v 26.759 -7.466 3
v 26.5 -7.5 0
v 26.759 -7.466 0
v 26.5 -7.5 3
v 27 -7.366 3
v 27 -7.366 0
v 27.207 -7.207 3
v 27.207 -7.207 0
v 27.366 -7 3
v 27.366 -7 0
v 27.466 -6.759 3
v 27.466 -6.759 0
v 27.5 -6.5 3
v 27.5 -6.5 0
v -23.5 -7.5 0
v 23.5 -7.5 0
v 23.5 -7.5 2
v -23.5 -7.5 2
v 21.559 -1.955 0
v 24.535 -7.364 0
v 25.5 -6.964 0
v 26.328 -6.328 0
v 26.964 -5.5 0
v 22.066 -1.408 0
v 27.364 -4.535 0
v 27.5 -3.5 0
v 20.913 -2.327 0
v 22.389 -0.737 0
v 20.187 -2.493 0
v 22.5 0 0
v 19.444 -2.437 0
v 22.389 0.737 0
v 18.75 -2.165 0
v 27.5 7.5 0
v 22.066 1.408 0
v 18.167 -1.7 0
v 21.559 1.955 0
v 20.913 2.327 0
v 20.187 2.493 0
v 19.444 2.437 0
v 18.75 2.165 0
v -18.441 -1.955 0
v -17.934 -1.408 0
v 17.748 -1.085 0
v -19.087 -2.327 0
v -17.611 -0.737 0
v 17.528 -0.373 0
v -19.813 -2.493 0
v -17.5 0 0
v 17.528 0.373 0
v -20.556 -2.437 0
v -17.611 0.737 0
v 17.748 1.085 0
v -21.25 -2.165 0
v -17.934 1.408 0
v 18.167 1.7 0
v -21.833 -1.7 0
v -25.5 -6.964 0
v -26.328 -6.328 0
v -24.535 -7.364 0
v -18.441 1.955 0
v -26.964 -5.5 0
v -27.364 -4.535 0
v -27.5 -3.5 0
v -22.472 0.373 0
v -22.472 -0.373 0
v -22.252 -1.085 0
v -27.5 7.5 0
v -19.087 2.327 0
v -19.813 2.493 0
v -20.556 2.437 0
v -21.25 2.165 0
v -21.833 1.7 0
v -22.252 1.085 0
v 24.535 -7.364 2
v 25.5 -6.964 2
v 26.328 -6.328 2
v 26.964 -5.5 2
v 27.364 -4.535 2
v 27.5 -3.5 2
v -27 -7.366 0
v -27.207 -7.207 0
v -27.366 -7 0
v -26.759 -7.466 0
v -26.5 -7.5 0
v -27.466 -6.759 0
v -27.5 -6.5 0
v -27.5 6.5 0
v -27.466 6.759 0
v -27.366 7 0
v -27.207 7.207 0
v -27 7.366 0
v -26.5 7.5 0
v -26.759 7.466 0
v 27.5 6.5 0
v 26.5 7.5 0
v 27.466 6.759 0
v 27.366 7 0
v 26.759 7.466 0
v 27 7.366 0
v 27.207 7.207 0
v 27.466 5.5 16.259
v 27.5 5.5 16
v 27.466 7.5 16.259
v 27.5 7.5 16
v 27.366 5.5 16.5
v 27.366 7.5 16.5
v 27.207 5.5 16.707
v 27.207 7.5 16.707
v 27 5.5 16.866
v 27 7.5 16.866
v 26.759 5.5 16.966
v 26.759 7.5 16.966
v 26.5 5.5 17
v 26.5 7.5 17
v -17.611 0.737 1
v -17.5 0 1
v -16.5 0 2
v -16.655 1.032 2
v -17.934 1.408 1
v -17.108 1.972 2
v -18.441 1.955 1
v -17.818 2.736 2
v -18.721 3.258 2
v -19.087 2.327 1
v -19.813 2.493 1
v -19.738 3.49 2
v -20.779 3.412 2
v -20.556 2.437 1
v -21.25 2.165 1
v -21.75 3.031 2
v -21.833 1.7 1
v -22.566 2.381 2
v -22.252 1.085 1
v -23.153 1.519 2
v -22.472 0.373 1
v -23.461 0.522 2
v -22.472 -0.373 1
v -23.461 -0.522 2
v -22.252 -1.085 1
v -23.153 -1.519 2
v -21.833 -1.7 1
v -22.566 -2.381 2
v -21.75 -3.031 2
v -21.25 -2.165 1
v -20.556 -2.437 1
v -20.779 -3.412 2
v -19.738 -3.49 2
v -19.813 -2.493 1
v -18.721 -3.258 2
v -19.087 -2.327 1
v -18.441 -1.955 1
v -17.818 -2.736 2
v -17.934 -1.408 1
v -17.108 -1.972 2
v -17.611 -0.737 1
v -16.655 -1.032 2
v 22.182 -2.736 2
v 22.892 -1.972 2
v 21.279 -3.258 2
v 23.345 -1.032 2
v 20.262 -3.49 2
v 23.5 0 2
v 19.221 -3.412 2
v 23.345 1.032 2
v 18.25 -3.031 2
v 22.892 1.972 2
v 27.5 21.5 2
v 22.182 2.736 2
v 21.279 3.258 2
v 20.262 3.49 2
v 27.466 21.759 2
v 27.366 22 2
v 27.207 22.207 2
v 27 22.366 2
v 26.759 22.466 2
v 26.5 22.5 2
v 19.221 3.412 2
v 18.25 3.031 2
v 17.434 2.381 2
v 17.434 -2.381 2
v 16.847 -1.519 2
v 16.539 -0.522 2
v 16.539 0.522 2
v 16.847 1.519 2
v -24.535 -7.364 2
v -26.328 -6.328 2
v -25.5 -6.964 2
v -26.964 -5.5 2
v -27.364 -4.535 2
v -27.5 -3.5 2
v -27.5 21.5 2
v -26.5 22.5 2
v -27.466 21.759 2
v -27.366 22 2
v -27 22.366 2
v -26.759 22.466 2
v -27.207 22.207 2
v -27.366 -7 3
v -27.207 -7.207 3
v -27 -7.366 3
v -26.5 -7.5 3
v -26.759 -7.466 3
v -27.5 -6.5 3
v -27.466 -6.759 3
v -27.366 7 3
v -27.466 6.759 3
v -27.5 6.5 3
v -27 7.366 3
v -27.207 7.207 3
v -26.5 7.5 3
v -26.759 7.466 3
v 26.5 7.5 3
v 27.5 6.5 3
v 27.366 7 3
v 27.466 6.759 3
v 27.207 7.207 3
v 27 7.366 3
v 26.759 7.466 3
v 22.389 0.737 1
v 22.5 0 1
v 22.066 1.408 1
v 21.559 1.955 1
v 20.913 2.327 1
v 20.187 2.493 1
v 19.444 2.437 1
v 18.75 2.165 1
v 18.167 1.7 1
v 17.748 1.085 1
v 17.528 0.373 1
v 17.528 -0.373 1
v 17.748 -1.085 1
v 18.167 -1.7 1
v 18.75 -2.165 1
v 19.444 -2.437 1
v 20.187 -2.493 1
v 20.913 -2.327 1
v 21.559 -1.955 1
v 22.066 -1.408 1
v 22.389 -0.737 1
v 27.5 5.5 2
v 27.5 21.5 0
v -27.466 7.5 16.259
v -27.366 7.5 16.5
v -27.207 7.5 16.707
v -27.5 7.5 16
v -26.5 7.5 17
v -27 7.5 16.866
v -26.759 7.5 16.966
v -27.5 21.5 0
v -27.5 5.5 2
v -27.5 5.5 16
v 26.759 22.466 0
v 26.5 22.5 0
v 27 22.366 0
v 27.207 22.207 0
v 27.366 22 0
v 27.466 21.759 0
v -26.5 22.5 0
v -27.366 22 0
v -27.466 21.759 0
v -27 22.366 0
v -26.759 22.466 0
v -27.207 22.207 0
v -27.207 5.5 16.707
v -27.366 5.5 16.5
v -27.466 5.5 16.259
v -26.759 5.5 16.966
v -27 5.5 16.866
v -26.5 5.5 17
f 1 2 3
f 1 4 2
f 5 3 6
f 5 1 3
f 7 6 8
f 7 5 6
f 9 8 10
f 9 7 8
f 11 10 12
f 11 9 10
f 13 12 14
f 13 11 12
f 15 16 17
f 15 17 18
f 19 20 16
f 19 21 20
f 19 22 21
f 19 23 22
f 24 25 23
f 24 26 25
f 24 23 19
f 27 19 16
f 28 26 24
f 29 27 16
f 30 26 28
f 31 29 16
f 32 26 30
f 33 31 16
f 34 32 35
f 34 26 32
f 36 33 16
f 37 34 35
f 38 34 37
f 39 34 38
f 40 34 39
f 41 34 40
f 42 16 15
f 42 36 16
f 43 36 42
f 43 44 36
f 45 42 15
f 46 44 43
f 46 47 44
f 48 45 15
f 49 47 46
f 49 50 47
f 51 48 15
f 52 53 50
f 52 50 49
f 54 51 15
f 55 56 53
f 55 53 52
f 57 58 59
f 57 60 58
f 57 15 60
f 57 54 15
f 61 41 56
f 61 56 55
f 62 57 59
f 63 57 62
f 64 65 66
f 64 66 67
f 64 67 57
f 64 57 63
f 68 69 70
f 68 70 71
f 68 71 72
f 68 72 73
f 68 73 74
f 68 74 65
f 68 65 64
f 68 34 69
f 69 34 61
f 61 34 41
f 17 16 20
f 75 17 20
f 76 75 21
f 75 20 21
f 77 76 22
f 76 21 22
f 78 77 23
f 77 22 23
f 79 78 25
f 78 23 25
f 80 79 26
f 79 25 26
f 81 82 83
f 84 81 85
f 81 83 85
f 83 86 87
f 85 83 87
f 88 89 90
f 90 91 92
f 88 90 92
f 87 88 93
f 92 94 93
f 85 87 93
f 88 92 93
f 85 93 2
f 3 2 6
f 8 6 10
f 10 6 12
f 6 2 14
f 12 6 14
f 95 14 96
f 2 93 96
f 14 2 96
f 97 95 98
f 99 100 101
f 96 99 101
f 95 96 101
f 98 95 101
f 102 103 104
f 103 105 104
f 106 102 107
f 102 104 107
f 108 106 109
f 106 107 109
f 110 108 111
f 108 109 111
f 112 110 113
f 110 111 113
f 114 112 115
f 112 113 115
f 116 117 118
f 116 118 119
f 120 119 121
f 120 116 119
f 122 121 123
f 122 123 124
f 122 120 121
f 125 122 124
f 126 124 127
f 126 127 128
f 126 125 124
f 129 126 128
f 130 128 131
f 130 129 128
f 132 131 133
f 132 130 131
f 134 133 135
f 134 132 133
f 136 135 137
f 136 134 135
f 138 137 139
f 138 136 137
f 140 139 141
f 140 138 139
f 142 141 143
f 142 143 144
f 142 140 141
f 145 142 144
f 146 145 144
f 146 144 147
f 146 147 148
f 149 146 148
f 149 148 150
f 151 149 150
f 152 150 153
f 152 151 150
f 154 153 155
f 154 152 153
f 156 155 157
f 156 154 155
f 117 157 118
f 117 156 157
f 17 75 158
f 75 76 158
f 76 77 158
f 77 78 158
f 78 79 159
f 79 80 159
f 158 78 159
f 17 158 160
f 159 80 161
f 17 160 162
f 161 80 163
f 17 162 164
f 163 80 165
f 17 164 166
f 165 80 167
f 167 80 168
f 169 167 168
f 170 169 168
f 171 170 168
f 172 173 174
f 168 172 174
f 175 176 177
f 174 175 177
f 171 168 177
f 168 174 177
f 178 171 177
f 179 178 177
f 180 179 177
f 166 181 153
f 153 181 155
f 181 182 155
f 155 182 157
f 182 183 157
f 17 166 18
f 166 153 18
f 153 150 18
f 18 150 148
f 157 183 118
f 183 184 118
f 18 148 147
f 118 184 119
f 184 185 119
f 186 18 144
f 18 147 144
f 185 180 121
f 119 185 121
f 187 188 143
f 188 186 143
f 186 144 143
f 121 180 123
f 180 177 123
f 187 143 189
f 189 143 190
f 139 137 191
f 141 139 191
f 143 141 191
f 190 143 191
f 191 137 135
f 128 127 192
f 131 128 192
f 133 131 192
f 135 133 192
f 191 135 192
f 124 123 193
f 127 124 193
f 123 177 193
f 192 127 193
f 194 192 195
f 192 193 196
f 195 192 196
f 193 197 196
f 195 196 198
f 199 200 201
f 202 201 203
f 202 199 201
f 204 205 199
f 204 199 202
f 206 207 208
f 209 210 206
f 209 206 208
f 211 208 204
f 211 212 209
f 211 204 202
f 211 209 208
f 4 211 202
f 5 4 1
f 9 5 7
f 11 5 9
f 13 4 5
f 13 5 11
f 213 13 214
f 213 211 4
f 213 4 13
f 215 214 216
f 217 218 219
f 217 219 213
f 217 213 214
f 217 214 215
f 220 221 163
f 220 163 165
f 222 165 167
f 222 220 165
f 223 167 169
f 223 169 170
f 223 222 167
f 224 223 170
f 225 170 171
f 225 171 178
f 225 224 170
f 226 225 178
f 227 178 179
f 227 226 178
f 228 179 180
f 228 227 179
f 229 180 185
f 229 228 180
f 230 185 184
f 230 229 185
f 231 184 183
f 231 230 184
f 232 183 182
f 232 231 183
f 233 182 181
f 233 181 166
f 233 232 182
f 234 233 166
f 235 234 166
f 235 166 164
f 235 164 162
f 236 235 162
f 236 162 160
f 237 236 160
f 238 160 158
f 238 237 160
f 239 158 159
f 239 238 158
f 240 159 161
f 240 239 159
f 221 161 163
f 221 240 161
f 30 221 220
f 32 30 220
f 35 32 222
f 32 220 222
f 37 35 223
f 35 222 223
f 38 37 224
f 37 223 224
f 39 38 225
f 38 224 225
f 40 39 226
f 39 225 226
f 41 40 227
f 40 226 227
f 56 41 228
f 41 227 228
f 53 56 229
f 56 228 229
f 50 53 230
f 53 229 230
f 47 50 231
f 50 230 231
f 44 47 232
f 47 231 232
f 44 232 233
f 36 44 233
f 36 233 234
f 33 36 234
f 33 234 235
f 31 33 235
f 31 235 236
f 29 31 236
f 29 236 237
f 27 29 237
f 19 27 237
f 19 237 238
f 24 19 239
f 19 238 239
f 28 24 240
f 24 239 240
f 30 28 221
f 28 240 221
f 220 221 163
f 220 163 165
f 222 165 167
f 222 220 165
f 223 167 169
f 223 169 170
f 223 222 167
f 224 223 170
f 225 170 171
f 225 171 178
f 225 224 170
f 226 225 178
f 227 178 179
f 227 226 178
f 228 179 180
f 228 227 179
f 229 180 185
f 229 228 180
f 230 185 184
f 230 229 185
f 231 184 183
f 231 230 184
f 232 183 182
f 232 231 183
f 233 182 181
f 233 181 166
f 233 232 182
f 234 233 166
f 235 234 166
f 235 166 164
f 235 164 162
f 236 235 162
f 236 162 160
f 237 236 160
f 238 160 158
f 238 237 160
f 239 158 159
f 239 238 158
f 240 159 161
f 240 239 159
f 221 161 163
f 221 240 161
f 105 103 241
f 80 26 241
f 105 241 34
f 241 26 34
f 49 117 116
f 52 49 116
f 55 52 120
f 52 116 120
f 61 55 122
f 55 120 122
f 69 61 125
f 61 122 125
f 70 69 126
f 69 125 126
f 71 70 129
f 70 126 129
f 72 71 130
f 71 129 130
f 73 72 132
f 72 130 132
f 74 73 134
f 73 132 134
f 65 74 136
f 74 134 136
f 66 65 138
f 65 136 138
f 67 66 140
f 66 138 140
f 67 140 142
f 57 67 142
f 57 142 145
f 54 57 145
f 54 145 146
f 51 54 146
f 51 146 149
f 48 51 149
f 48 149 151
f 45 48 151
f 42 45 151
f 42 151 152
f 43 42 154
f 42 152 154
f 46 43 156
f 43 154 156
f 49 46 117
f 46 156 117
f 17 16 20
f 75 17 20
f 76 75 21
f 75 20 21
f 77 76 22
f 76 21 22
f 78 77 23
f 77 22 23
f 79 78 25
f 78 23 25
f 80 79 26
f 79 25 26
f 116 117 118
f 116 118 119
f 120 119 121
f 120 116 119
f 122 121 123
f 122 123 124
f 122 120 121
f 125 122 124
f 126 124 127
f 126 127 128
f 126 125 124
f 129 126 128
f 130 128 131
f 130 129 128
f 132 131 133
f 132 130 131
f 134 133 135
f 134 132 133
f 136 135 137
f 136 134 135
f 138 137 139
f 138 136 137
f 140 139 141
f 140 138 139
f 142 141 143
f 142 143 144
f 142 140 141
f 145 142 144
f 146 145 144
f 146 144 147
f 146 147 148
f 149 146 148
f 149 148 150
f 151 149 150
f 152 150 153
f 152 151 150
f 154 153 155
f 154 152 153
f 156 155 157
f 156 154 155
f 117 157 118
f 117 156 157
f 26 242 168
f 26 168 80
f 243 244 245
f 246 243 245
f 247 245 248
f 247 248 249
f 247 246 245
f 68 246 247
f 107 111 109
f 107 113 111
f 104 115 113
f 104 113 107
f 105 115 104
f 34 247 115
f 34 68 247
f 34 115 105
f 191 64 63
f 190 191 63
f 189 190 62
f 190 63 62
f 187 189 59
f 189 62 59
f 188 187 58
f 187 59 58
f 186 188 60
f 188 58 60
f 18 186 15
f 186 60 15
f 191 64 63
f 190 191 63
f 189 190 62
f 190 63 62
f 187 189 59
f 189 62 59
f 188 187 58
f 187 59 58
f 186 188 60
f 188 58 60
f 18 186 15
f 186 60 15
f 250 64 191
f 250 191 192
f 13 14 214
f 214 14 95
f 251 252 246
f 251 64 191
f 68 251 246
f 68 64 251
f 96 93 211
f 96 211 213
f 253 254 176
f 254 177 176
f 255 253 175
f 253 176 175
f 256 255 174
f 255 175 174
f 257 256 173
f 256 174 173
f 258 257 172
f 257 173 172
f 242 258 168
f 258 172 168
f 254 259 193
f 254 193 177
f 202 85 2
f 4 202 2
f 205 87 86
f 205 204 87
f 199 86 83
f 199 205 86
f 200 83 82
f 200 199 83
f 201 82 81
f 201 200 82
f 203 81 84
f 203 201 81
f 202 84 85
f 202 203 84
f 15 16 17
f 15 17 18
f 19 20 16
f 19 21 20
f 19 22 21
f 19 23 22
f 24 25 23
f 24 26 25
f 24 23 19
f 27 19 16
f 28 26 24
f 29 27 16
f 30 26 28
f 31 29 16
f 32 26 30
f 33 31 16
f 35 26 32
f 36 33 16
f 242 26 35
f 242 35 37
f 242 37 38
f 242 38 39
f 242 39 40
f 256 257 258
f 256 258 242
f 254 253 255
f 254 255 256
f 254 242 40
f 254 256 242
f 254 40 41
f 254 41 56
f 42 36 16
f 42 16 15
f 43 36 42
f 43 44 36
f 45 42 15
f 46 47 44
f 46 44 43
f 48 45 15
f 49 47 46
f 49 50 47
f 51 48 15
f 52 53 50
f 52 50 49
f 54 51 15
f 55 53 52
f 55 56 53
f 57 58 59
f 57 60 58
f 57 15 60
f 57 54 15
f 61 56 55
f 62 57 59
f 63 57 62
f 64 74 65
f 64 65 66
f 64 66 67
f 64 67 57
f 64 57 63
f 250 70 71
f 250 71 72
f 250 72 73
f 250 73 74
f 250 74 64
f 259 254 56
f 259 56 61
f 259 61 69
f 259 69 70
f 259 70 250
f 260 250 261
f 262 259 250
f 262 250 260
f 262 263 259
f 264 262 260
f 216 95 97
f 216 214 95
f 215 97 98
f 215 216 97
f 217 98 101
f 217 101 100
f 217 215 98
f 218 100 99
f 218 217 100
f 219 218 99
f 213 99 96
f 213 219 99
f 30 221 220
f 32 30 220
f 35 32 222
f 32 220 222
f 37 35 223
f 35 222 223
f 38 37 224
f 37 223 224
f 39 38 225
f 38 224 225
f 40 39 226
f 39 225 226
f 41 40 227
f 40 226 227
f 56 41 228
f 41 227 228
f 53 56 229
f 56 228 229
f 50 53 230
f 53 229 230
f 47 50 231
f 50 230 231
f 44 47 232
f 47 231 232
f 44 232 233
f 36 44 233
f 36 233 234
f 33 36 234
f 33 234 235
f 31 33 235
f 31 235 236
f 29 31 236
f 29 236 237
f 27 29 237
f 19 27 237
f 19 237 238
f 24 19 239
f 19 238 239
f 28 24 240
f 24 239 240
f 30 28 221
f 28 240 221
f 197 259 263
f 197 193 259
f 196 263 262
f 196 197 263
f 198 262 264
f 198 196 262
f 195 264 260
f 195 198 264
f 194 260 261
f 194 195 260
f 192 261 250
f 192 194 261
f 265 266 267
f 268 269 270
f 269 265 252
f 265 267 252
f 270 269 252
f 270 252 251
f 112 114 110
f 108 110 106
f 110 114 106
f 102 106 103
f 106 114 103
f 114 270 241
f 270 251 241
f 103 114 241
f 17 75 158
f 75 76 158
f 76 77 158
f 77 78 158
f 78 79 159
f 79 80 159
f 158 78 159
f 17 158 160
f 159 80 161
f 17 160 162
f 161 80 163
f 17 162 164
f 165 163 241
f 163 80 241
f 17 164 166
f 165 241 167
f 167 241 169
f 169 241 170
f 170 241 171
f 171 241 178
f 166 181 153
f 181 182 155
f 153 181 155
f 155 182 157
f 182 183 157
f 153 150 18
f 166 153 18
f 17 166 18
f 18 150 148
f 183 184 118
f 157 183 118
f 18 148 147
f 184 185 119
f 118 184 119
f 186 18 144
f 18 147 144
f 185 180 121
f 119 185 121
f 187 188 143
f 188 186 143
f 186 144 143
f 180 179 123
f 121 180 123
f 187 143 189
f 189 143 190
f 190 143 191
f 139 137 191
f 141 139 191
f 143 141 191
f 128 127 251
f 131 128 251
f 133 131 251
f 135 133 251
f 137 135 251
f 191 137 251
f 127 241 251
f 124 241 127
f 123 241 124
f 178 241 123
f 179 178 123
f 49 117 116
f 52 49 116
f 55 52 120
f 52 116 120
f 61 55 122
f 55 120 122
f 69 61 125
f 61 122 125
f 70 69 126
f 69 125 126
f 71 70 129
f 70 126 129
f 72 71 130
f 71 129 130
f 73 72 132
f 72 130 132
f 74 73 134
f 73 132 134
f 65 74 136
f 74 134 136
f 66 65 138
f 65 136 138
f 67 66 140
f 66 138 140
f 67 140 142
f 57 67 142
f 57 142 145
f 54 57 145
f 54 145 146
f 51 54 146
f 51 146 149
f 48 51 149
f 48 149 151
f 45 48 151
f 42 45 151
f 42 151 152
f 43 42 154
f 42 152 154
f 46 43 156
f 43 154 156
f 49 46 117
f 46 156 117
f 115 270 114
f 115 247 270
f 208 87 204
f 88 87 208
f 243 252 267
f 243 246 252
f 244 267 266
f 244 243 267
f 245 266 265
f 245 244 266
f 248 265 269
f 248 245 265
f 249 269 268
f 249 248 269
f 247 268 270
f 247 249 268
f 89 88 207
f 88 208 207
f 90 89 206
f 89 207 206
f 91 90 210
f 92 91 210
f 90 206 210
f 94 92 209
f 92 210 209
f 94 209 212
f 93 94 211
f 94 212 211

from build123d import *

# Parameters (mm, degrees)
PAD_DEPTH       = 2
SKETCH001_W     = 55
SKETCH001_H     = 2
PAD001_DEPTH    = 15
FILLET_R        = 1
SKETCH002_R     = 2.5
POCKET_DEPTH    = 2
CHAMFER_SIZE    = 1
PAD002_DEPTH    = 2
SKETCH004_R     = 2.5
POCKET001_DEPTH = 2
CHAMFER001_SIZE = 1
FILLET001_R     = 1
SKETCH005_W     = 55
SKETCH005_H     = 15
PAD003_DEPTH    = 3
FILLET002_R     = 1


with BuildPart() as battery_brackets_edge_body:
    # Sketch → Pad (new body)
    with BuildSketch(Plane.XY):
        with BuildLine():
            Line((-27.5, 7.5), (27.5, 7.5))
            Line((27.5, 7.5), (27.5, -3.5))
            ThreePointArc((23.5, -7.5), (26.328427, -6.328427), (27.5, -3.5))
            Line((23.5, -7.5), (-23.5, -7.5))
            ThreePointArc((-27.5, -3.5), (-26.328427, -6.328427), (-23.5, -7.5))
            Line((-27.5, -3.5), (-27.5, 7.5))
        make_face()
    extrude(amount=PAD_DEPTH)

    # Sketch001 (on Face8 of Pad) → Pad001 (join)
    with BuildSketch(Plane.XY.offset(2)):
        with Locations((0, 6.5)):
            Rectangle(SKETCH001_W, SKETCH001_H)
    extrude(amount=PAD001_DEPTH)

    # Fillet
    fillet_edges = [battery_brackets_edge_body.edges().sort_by_distance(p)[0] for p in [
        (-27.5, 6.5, 17),
        (27.5, 6.5, 17),
    ]]
    fillet(fillet_edges, radius=FILLET_R)

    # Sketch002 (on Face8 of Fillet) → Pocket (cut)
    with BuildSketch(Plane.XY.offset(2)):
        with Locations((-20, 0)):
            Circle(SKETCH002_R)
        with Locations((20, 0)):
            Circle(SKETCH002_R)
    extrude(amount=-POCKET_DEPTH, mode=Mode.SUBTRACT)

    # Chamfer
    chamfer_edges = [battery_brackets_edge_body.edges().sort_by_distance(p)[0] for p in [
        (17.5, 0, 2),
        (-22.5, 0, 2),
    ]]
    chamfer(chamfer_edges, length=CHAMFER_SIZE)


with BuildPart() as battery_brackets_flat_body:
    # Sketch003 → Pad002 (new body)
    with BuildSketch(Plane.XY):
        with BuildLine():
            Line((-27.5, 22.5), (27.5, 22.5))
            Line((27.5, 22.5), (27.5, -3.5))
            ThreePointArc((23.5, -7.5), (26.328427, -6.328427), (27.5, -3.5))
            Line((23.5, -7.5), (-23.5, -7.5))
            ThreePointArc((-27.5, -3.5), (-26.328427, -6.328427), (-23.5, -7.5))
            Line((-27.5, -3.5), (-27.5, 22.5))
        make_face()
    extrude(amount=PAD002_DEPTH)

    # Sketch004 (on Face8 of Pad002) → Pocket001 (cut)
    with BuildSketch(Plane.XY.offset(2)):
        with Locations((-20, 0)):
            Circle(SKETCH004_R)
        with Locations((20, 0)):
            Circle(SKETCH004_R)
    extrude(amount=-POCKET001_DEPTH, mode=Mode.SUBTRACT)

    # Chamfer001
    chamfer001_edges = [battery_brackets_flat_body.edges().sort_by_distance(p)[0] for p in [
        (-22.5, 0, 2),
        (17.5, 0, 2),
    ]]
    chamfer(chamfer001_edges, length=CHAMFER001_SIZE)

    # Fillet001
    fillet001_edges = [battery_brackets_flat_body.edges().sort_by_distance(p)[0] for p in [
        (27.5, 22.5, 1),
        (-27.5, 22.5, 1),
    ]]
    fillet(fillet001_edges, radius=FILLET001_R)


with BuildPart() as battery_brackets_flat_shim_body:
    # Sketch005 → Pad003 (new body)
    with BuildSketch(Plane.XY):
        Rectangle(SKETCH005_W, SKETCH005_H)
    extrude(amount=PAD003_DEPTH)

    # Fillet002
    fillet002_edges = [battery_brackets_flat_shim_body.edges().sort_by_distance(p)[0] for p in [
        (-27.5, -7.5, 1.5),
        (27.5, -7.5, 1.5),
        (-27.5, 7.5, 1.5),
        (27.5, 7.5, 1.5),
    ]]
    fillet(fillet002_edges, radius=FILLET002_R)


solid = Compound([battery_brackets_edge_body.part, battery_brackets_flat_body.part, battery_brackets_flat_shim_body.part])
